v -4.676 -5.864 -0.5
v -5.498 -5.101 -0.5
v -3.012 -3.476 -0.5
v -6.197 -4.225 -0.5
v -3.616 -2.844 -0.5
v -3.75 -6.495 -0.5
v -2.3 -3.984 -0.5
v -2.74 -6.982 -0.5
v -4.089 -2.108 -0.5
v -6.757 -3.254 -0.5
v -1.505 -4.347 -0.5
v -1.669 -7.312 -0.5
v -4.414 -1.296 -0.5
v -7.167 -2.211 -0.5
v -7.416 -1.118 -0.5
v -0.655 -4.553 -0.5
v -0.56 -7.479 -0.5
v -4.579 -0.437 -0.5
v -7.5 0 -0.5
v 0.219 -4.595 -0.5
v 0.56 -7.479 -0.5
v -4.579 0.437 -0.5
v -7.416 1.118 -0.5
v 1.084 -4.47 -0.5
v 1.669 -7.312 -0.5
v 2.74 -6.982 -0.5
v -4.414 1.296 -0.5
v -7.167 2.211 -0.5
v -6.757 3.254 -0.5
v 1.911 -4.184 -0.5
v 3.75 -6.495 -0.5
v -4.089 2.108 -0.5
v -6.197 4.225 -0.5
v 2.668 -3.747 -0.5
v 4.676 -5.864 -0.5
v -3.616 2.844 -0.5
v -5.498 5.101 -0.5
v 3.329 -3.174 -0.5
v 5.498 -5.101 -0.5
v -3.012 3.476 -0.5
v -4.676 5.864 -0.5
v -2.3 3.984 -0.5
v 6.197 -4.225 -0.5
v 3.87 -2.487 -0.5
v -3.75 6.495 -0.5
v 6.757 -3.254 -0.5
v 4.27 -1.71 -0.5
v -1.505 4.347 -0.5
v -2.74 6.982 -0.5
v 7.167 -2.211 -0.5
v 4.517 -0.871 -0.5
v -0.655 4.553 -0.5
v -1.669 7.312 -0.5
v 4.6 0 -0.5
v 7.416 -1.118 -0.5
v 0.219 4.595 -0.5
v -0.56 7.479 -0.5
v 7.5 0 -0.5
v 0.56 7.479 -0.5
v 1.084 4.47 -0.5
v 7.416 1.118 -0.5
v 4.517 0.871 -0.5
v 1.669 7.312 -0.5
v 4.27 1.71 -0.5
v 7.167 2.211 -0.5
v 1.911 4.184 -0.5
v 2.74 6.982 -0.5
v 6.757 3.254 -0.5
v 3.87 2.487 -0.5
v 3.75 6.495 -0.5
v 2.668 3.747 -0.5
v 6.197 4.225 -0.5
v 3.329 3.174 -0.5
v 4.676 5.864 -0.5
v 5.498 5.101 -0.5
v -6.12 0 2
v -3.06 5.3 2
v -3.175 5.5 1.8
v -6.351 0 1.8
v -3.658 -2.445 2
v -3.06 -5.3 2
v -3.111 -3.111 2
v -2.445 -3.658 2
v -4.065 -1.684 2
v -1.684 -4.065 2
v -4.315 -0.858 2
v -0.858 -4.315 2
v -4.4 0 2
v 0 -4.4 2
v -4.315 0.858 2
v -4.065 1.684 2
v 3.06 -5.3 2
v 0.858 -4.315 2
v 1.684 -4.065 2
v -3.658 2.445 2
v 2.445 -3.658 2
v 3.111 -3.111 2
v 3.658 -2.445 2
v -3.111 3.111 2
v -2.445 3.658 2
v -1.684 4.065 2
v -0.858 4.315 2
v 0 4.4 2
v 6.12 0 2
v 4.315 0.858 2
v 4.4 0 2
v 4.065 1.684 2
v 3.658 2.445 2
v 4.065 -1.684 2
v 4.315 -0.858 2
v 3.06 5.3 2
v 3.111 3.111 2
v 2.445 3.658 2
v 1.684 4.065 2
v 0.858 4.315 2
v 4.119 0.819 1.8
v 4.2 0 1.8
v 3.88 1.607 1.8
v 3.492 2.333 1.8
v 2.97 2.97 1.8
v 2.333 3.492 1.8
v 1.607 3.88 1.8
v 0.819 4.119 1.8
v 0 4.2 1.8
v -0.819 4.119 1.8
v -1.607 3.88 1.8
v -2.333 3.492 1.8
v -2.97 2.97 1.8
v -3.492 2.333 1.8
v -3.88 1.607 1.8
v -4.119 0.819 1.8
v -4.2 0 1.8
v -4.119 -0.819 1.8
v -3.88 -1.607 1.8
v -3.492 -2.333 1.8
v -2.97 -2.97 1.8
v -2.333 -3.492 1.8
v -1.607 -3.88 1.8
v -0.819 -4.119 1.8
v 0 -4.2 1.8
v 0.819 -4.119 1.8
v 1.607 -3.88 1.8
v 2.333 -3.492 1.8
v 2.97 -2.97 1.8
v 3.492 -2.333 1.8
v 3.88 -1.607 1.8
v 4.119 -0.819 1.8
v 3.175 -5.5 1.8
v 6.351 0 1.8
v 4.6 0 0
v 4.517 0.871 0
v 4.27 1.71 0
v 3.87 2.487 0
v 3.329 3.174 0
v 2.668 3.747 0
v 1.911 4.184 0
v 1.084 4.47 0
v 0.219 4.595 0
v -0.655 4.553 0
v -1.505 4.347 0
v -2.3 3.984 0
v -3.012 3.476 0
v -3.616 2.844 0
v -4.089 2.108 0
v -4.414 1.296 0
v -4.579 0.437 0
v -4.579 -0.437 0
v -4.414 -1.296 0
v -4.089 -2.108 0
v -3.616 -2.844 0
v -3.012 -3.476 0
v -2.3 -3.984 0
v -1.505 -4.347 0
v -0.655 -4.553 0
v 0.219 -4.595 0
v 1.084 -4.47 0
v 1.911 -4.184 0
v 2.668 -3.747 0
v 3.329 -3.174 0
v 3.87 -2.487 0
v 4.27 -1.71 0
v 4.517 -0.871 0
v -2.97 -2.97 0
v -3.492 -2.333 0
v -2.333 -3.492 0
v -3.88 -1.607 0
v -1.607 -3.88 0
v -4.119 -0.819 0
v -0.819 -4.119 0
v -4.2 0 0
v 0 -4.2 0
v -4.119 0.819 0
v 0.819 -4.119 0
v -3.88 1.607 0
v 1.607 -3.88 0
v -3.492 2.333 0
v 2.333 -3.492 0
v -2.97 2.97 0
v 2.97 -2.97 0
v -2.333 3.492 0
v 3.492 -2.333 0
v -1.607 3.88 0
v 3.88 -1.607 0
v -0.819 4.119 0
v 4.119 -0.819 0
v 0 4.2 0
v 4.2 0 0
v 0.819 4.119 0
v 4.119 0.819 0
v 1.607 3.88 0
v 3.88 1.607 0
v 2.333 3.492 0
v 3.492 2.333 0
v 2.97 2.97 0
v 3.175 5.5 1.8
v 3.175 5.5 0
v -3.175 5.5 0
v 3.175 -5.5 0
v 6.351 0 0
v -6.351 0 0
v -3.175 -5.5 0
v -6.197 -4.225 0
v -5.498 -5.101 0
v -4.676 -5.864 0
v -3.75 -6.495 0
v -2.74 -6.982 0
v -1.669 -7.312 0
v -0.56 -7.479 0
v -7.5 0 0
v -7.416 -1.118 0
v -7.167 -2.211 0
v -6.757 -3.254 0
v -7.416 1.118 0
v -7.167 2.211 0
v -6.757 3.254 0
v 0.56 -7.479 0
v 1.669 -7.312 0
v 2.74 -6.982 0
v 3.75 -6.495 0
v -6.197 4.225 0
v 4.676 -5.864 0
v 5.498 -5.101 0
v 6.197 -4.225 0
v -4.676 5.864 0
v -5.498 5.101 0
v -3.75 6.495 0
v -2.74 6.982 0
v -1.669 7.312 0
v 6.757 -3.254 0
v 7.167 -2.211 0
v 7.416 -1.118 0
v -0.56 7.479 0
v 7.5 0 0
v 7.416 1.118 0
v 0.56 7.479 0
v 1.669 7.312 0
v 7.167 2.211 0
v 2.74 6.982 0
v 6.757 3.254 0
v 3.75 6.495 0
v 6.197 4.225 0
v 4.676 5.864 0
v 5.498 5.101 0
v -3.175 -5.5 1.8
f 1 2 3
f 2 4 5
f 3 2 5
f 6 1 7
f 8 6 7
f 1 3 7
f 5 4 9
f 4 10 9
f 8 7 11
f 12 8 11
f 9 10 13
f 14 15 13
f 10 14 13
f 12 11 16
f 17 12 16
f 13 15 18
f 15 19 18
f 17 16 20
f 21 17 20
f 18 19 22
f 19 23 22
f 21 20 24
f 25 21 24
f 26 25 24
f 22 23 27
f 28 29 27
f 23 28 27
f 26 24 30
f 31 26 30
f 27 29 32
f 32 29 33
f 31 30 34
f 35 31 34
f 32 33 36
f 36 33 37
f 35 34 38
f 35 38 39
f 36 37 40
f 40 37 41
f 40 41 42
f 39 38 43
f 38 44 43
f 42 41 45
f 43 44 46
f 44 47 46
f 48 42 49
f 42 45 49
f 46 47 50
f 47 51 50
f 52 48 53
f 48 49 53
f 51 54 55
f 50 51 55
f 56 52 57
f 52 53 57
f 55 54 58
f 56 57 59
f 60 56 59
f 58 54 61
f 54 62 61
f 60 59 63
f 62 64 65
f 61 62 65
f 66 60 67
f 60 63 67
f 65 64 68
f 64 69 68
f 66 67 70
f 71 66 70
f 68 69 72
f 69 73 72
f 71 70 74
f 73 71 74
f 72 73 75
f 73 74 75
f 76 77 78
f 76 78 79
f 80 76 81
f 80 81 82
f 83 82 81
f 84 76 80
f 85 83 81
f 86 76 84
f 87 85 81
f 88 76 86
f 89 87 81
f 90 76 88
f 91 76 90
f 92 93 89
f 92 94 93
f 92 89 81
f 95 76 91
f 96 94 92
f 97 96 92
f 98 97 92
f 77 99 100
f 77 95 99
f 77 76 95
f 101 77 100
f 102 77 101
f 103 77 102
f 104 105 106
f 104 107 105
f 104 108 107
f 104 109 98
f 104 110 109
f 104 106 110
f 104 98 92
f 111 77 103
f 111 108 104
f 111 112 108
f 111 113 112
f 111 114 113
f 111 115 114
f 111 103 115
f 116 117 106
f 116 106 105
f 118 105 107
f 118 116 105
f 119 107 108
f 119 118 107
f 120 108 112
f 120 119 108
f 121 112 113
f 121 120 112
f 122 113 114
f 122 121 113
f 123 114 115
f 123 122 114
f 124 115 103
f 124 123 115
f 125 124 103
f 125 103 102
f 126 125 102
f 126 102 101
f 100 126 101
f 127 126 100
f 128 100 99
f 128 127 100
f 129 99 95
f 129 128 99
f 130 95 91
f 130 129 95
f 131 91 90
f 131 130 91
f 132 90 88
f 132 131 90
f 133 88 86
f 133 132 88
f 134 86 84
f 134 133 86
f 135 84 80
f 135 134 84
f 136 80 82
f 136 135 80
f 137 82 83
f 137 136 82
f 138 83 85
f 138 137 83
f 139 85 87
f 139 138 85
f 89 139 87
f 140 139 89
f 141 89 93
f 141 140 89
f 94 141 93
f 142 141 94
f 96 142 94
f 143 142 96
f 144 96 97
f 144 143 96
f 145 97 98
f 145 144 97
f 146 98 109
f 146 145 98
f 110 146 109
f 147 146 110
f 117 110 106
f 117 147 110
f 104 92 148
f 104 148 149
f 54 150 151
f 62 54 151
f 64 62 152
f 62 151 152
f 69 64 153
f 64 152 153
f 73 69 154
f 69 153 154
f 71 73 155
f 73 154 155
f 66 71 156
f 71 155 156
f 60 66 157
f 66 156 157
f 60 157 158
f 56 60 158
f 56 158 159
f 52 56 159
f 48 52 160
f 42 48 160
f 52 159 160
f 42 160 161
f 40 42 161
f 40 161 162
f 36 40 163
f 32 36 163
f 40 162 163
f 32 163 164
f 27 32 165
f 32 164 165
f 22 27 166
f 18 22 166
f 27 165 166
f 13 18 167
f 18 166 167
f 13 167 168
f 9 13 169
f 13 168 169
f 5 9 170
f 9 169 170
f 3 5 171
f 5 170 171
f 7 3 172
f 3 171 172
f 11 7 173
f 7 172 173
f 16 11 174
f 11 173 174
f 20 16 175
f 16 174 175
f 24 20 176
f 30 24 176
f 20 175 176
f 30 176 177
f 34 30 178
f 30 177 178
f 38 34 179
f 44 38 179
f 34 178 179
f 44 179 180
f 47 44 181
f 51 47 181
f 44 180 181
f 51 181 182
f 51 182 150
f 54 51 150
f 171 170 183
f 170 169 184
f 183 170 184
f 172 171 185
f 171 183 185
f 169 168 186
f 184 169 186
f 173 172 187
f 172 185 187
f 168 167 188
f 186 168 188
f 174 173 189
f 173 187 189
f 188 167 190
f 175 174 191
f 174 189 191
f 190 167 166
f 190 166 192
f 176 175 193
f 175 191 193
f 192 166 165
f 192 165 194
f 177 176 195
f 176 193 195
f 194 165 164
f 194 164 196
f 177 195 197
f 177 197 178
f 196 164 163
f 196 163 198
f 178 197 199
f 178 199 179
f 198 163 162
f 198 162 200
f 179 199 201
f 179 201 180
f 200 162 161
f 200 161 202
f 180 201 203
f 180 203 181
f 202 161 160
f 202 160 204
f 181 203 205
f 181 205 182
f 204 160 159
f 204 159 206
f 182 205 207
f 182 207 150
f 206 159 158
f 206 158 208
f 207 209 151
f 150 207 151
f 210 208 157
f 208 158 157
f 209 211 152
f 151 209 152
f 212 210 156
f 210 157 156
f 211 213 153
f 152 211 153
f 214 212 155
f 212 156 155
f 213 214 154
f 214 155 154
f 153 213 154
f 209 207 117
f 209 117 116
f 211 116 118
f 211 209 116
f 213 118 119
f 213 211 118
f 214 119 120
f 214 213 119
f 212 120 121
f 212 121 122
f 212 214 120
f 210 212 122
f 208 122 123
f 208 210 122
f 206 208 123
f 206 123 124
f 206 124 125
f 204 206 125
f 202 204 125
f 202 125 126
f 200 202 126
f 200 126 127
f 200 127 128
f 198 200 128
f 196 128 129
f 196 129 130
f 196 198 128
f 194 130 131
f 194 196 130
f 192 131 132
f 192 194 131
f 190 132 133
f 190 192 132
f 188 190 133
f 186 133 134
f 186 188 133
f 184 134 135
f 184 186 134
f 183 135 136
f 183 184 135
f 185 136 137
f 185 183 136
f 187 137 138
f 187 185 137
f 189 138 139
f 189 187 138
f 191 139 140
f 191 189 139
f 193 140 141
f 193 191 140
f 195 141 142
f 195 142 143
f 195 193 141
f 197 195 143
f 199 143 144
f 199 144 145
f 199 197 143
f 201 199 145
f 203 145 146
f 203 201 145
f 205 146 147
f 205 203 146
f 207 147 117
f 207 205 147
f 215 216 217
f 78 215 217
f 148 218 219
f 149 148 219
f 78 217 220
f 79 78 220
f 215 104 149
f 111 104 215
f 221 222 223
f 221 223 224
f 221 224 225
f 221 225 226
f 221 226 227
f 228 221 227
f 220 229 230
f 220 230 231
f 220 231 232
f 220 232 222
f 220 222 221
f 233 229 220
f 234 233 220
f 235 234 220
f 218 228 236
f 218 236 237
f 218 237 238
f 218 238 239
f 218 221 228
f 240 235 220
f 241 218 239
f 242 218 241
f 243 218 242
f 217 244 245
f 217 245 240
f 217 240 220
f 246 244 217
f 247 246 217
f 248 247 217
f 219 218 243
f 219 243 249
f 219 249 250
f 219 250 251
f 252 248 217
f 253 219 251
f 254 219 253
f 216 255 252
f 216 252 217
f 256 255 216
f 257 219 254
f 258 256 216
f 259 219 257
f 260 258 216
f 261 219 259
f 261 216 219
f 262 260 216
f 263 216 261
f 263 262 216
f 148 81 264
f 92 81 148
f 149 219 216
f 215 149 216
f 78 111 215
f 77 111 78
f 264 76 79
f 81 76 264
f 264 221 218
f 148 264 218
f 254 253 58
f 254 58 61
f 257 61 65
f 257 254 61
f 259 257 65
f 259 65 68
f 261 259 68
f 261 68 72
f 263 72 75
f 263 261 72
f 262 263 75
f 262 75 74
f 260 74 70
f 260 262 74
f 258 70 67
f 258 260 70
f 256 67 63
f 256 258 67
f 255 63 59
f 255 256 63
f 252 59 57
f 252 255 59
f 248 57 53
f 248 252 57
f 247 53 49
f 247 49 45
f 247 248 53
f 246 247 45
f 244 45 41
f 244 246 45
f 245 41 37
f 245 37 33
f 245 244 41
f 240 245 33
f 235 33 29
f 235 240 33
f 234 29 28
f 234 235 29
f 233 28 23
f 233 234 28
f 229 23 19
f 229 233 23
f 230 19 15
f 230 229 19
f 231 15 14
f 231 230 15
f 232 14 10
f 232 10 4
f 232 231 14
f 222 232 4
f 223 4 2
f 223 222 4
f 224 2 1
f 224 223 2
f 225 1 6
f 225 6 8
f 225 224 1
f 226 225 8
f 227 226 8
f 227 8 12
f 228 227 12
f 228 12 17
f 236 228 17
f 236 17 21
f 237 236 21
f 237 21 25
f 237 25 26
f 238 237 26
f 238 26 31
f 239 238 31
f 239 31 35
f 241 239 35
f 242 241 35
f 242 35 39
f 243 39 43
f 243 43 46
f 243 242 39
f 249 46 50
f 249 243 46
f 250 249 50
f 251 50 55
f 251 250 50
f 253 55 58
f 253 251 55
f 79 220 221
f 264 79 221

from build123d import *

# Parameters (mm, degrees)
SKETCH_R      = 4.2
PAD_DEPTH     = 2
SKETCH001_R   = 7.5
SKETCH001_R_2 = 4.6
PAD001_DEPTH  = 0.5
CHAMFER_SIZE  = 0.2


with BuildPart() as part:
    # Sketch → Pad (new body)
    with BuildSketch(Plane.XY):
        Polygon((6.350853, 0), (3.175426, 5.5), (-3.175426, 5.5), (-6.350853, 0), (-3.175426, -5.5), (3.175426, -5.5), align=None)
        Circle(SKETCH_R, mode=Mode.SUBTRACT)
    extrude(amount=PAD_DEPTH)

    # Sketch001 → Pad001 (join)
    with BuildSketch(Plane.XY):
        Circle(SKETCH001_R)
        Circle(SKETCH001_R_2, mode=Mode.SUBTRACT)
    extrude(amount=-PAD001_DEPTH)

    # Chamfer
    chamfer_edges = [part.edges().sort_by_distance(p)[0] for p in [
        (-4.2, 0, 2),
        (-4.76314, 2.75, 2),
        (-4.76314, -2.75, 2),
        (0, -5.5, 2),
        (4.76314, -2.75, 2),
        (4.76314, 2.75, 2),
        (0, 5.5, 2),
    ]]
    chamfer(chamfer_edges, length=CHAMFER_SIZE)


solid = part.part
